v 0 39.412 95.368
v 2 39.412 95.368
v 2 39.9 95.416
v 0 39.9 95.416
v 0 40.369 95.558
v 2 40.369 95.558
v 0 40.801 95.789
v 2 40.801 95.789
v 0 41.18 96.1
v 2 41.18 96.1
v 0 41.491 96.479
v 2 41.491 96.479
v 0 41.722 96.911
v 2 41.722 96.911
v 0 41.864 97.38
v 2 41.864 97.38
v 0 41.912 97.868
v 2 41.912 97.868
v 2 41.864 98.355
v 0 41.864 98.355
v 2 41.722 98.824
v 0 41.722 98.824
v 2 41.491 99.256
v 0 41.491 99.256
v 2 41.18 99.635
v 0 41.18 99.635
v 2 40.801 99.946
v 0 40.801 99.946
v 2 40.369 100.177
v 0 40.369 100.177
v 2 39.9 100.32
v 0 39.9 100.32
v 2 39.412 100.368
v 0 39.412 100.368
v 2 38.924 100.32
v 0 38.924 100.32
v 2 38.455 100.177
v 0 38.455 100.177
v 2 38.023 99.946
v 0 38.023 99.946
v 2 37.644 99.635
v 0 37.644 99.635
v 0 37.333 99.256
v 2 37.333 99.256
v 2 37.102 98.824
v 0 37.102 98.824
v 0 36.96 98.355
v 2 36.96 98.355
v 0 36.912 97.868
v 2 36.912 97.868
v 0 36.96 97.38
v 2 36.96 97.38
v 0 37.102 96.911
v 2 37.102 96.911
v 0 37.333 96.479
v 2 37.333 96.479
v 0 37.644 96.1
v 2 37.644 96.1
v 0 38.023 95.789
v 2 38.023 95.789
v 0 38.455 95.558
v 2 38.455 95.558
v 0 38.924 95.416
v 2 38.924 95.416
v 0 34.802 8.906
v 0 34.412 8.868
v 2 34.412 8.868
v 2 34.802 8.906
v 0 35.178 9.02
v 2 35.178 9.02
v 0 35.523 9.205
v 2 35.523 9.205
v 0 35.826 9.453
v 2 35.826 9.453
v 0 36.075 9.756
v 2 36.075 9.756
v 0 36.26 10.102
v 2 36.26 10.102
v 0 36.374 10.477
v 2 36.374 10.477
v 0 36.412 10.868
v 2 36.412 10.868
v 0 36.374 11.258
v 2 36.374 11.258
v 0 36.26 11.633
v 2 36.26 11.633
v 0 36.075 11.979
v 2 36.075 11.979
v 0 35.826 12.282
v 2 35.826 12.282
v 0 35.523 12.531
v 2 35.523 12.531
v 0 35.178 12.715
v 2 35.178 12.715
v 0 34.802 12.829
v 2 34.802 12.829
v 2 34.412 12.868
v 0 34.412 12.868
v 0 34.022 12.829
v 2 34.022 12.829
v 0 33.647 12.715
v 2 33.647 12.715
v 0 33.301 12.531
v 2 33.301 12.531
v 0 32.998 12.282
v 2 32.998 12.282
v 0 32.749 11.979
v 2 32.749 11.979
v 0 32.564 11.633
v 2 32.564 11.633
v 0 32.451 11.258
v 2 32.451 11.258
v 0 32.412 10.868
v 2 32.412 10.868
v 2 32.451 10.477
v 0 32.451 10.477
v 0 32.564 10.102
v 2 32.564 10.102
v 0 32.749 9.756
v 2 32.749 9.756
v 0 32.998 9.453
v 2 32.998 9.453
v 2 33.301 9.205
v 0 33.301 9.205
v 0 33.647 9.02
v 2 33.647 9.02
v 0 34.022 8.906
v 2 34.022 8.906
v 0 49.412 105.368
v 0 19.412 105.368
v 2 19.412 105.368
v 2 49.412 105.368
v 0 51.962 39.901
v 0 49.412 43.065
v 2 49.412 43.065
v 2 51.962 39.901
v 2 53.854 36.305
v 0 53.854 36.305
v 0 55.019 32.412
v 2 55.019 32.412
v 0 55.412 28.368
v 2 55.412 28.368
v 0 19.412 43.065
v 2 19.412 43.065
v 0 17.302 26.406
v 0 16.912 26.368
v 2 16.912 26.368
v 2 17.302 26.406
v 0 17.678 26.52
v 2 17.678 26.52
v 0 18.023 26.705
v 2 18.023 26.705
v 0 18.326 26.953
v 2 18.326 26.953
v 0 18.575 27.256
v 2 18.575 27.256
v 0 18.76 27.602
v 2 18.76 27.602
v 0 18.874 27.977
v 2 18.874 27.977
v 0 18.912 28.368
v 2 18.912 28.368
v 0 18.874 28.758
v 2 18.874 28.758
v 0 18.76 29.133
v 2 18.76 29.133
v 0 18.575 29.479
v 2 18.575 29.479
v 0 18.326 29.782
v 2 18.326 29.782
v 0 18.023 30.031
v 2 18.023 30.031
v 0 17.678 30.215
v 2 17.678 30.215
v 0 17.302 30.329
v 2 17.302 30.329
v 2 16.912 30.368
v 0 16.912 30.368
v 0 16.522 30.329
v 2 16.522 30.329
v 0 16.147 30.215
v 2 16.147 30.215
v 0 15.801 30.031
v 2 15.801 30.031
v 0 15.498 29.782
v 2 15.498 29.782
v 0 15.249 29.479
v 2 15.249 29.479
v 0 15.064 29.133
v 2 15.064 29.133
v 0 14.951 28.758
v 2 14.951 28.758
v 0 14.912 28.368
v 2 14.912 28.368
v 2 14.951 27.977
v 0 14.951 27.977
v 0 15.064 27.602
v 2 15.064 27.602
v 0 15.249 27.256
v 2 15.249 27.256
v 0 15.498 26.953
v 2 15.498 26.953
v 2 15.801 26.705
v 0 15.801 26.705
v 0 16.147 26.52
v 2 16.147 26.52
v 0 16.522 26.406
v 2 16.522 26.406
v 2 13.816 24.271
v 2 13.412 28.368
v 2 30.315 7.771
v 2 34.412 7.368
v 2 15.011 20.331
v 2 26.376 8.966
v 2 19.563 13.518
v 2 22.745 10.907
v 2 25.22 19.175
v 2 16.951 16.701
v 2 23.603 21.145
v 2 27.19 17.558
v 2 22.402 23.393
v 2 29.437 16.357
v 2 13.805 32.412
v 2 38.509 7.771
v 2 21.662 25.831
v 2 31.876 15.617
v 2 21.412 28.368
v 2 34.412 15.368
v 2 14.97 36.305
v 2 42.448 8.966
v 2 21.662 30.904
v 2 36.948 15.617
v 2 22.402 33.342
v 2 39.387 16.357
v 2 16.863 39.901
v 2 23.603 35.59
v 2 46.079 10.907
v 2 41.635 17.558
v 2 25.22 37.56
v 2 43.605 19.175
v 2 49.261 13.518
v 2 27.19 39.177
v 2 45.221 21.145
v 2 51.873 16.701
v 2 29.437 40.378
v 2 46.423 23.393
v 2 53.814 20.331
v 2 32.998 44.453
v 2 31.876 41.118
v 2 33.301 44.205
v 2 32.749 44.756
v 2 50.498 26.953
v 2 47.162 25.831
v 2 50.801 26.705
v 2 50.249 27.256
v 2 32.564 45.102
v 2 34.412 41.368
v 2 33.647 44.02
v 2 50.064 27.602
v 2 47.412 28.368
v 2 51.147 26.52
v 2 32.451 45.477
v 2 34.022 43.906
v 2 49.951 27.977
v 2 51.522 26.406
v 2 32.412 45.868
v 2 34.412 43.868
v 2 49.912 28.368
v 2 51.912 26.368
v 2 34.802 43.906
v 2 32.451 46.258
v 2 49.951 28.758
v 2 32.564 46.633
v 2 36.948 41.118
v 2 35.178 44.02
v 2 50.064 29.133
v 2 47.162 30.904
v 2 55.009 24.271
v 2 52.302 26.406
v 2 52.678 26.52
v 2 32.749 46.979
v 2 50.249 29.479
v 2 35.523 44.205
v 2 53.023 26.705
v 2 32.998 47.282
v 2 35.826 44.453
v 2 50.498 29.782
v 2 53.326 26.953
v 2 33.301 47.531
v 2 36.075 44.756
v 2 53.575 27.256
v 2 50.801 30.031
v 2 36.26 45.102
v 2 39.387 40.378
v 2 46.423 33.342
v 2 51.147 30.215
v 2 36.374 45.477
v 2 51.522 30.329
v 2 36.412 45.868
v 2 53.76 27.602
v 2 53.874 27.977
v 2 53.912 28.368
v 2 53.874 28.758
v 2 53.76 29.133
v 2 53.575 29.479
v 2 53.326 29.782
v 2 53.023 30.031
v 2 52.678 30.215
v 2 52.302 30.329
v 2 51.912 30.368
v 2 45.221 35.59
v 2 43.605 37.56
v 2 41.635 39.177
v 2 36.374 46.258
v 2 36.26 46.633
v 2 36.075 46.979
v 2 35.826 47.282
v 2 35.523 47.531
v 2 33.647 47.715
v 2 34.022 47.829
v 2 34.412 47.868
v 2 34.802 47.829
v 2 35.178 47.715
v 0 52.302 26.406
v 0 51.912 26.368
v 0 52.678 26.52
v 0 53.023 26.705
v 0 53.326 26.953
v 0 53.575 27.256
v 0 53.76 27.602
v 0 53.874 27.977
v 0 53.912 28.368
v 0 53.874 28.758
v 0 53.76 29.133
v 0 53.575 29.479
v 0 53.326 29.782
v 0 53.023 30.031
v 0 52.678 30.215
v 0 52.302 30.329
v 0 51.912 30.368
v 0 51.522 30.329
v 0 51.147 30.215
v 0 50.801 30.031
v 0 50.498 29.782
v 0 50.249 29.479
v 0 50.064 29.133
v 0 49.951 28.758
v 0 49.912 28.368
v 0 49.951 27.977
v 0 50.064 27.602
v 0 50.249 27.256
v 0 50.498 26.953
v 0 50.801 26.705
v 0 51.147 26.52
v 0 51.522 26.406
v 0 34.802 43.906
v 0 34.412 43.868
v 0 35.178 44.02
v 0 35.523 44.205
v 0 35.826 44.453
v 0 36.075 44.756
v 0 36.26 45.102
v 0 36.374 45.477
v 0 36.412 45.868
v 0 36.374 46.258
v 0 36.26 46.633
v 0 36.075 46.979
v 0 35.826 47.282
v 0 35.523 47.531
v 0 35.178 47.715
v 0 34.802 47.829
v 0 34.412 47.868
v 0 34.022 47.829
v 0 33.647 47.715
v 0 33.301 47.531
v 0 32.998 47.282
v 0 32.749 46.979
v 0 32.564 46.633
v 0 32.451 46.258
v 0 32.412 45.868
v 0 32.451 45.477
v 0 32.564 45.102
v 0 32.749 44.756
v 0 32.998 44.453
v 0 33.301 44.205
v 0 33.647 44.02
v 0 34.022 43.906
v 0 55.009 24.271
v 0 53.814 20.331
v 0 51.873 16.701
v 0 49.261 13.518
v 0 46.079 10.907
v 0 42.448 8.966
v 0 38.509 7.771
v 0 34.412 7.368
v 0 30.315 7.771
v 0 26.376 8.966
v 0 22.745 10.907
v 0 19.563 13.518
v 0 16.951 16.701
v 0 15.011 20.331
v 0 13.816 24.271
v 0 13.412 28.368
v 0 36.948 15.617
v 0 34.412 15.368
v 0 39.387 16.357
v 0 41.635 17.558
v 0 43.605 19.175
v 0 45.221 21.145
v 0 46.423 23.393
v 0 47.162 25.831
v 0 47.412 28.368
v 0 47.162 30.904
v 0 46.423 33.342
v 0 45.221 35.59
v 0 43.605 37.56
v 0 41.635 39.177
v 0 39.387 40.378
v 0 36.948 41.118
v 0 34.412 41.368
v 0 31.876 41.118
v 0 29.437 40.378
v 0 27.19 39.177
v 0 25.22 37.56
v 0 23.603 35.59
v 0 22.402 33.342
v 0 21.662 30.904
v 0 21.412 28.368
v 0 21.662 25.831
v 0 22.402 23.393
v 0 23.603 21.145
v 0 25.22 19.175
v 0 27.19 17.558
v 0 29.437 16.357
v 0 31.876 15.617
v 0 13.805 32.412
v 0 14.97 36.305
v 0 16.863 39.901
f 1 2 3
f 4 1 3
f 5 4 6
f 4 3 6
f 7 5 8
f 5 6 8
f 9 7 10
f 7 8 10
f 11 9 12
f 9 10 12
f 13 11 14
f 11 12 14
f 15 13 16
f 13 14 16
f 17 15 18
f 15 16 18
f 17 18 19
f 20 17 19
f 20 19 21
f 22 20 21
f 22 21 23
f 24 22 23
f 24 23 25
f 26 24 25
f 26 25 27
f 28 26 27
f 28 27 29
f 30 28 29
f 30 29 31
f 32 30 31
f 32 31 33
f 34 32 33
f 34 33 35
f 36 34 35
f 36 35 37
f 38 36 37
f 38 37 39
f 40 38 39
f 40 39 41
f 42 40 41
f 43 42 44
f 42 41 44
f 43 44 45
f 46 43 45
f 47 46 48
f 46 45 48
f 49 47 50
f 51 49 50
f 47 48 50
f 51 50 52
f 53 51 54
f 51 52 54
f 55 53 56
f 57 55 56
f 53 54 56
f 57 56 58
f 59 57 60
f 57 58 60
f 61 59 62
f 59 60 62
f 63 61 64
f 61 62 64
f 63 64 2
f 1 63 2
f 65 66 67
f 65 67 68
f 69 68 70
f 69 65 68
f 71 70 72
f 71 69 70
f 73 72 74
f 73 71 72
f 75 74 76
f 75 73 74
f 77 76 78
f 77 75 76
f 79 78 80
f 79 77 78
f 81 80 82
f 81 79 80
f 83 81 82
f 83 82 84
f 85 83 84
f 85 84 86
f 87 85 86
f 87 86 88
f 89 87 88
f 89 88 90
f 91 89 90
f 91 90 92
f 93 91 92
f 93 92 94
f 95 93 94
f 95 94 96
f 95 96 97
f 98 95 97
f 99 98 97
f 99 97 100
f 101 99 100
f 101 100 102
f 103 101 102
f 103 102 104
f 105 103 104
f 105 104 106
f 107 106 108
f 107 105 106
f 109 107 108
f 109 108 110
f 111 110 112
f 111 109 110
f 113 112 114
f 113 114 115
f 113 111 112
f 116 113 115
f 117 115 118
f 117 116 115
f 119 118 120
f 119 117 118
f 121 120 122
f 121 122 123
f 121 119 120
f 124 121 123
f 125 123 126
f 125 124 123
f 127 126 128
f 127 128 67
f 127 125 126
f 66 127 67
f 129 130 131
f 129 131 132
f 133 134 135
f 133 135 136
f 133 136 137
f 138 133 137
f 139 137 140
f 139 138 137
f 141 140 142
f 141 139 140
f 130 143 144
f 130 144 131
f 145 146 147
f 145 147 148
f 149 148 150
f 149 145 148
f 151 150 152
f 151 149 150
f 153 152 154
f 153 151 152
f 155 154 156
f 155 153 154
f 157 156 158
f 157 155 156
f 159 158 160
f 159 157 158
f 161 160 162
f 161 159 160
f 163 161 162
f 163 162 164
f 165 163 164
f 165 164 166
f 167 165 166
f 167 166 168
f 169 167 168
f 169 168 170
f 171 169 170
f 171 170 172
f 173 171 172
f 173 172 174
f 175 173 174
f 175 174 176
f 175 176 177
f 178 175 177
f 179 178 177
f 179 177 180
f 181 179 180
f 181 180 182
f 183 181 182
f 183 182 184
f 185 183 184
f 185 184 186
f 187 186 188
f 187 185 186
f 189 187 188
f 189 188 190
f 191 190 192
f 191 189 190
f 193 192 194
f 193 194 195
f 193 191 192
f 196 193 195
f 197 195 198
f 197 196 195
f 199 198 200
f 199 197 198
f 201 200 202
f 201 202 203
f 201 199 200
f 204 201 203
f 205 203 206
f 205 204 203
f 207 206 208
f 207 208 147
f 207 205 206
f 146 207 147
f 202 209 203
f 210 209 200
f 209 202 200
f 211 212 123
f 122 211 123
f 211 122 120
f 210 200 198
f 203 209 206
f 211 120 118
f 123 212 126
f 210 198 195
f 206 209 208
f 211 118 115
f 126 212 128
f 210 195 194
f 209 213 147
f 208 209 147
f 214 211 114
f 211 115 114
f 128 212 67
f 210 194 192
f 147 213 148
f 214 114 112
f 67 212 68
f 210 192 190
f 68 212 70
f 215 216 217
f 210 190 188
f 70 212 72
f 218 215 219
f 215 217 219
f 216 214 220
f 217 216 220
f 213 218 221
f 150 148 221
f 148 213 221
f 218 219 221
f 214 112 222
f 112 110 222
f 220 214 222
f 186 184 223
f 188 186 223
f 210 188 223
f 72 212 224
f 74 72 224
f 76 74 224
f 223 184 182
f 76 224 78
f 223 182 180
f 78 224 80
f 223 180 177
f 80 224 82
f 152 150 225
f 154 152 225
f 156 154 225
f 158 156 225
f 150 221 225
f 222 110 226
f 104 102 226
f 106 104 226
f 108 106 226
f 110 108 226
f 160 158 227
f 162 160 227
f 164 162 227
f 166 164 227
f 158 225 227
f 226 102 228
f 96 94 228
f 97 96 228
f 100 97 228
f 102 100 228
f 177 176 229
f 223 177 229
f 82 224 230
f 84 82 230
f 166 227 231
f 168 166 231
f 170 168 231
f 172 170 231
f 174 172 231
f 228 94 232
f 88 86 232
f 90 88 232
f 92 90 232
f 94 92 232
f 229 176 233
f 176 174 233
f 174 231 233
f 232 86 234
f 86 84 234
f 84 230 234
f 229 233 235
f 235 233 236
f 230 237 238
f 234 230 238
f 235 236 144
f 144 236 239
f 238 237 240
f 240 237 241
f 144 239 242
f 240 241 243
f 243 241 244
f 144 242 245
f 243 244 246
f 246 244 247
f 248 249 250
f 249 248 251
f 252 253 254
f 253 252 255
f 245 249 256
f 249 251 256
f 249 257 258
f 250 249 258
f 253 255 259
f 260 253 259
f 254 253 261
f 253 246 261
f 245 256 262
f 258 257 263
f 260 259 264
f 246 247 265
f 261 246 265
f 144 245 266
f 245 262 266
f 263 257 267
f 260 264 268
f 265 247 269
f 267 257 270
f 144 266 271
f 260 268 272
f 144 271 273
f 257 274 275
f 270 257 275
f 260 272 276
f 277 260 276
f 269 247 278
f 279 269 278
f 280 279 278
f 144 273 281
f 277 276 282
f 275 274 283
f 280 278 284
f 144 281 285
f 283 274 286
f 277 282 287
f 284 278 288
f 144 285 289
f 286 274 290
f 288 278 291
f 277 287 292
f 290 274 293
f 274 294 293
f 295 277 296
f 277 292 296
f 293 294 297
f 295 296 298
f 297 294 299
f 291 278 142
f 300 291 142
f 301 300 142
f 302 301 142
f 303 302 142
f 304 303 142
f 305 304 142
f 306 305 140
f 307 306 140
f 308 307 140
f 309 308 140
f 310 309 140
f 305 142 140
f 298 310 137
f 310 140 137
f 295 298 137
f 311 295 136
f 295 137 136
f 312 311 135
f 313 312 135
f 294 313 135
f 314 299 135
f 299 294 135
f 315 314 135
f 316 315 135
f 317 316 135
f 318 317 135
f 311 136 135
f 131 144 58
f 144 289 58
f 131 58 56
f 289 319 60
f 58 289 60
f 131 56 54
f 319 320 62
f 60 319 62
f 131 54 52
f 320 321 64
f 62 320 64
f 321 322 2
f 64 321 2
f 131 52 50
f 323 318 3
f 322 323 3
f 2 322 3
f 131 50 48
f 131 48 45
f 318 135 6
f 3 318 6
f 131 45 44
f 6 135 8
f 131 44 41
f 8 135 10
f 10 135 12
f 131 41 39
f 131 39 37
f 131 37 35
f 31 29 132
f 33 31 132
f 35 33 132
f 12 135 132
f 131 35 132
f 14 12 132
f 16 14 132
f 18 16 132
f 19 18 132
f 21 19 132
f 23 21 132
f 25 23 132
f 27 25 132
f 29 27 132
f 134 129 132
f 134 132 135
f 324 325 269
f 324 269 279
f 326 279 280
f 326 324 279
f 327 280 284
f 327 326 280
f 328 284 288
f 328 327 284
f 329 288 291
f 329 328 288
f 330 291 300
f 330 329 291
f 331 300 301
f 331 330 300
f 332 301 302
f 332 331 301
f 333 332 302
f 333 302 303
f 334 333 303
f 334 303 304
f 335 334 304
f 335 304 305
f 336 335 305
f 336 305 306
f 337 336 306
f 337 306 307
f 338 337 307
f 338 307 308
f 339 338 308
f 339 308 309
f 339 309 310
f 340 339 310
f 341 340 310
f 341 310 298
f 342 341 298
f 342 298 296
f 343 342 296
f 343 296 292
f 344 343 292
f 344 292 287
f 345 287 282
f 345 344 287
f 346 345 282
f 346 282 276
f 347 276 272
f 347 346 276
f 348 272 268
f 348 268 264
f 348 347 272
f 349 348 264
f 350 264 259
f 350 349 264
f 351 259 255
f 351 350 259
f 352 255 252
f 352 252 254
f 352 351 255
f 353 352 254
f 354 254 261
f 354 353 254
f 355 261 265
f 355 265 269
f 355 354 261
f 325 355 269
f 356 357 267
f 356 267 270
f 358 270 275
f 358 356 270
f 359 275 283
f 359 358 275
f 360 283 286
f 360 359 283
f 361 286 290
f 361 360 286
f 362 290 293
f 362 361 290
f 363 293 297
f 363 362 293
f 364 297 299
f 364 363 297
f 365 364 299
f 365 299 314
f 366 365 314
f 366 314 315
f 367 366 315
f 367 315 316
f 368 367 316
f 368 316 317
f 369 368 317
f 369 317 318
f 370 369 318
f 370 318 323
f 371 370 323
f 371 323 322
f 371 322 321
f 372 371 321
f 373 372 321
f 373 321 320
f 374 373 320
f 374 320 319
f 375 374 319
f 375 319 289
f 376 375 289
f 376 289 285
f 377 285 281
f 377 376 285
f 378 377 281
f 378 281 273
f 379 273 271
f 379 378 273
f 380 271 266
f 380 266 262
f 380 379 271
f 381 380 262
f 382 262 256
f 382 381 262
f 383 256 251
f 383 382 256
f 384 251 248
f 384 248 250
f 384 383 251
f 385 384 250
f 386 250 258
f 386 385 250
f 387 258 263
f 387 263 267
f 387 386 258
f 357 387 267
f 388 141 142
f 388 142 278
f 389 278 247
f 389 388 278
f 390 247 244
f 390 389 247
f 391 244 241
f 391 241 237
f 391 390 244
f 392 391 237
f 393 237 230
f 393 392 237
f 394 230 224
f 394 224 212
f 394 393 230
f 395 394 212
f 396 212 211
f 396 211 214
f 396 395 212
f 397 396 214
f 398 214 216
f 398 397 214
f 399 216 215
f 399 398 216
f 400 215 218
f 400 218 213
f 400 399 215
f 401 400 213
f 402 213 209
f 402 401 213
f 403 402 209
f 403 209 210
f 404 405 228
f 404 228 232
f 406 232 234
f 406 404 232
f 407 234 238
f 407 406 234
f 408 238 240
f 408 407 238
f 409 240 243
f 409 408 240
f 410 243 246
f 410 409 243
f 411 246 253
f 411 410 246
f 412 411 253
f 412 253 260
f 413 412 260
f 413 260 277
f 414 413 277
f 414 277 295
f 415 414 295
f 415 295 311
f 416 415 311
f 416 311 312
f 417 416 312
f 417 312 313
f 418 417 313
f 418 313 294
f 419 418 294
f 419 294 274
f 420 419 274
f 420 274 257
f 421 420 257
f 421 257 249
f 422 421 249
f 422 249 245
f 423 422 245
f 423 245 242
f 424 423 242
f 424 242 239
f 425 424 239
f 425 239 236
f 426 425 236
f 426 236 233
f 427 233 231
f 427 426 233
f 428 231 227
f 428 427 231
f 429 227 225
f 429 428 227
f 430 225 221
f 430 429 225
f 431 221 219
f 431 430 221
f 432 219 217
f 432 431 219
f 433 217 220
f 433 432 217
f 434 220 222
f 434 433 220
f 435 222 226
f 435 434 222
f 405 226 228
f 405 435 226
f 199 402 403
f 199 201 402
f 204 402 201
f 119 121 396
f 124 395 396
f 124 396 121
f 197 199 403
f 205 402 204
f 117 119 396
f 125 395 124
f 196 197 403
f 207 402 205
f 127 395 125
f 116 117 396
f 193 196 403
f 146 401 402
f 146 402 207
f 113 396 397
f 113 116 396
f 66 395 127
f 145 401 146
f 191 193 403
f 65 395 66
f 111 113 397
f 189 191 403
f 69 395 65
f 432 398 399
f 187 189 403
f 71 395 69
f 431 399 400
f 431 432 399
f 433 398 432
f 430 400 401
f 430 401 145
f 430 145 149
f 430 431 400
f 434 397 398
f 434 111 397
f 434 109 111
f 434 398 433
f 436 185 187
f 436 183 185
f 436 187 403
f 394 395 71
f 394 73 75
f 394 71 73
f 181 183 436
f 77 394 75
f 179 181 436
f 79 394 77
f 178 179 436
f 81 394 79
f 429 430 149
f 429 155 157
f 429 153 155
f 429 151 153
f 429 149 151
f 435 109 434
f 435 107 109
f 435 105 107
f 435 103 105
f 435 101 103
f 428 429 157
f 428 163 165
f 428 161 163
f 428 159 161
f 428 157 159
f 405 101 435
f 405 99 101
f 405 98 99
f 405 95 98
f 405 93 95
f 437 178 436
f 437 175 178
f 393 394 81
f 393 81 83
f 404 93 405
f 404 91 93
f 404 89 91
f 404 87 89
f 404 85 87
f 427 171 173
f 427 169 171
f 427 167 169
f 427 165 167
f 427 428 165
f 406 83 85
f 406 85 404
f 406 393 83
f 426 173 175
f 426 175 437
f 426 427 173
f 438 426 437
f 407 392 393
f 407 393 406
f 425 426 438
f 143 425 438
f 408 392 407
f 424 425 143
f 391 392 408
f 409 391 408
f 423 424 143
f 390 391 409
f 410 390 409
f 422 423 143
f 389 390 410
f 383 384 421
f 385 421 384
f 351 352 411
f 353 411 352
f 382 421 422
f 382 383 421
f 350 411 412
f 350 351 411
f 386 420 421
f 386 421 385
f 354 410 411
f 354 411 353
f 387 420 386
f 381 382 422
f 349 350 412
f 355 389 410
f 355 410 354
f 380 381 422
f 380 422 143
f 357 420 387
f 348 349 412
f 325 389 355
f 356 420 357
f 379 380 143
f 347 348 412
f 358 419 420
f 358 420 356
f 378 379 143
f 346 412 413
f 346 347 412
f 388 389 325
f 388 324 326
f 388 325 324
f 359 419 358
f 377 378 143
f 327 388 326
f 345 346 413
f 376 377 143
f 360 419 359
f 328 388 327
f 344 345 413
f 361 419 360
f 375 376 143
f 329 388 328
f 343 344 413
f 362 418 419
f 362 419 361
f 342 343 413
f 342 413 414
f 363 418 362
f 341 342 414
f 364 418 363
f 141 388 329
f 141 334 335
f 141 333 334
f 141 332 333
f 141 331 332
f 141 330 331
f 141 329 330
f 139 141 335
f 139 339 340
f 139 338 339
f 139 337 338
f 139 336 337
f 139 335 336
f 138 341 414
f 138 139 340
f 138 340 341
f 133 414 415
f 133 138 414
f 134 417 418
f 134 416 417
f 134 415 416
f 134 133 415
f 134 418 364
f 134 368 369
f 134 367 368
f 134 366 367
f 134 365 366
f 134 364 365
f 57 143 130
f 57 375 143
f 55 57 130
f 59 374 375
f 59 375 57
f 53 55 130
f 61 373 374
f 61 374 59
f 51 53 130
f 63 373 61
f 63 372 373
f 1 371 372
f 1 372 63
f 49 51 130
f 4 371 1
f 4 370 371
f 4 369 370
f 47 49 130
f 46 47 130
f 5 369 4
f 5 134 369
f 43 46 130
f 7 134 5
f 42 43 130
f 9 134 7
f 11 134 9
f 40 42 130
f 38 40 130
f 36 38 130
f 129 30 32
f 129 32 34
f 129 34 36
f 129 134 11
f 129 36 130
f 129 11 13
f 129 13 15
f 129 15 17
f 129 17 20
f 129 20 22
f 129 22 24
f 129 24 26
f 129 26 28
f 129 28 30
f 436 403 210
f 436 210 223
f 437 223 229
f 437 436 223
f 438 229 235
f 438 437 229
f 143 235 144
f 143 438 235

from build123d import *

# Parameters (mm, degrees)
EXTRUDE_1_DEPTH     = 2
CUT_EXTRUDE_START   = -3
SKETCH_2_R          = 2
SKETCH_2_R_2        = 13
CUT_EXTRUDE_1_DEPTH = 3
CUT_EXTRUDE_START_2 = -10
CUT_EXTRUDE_2_DEPTH = 10
SKETCH_3_R          = 2.5
CUT_EXTRUDE_4_DEPTH = 10


with BuildPart() as part:
    # 草图1 → 凸台-拉伸1 (new body)
    with BuildSketch(Plane(origin=(0, 0, 0), x_dir=(0, 0, -1), z_dir=(1, 0, 0))):
        with BuildLine():
            Line((-105.367573178, 55.412145146), (-28.367573178, 55.412145146))
            ThreePointArc((-28.367573178, 55.412145146), (-7.367573178, 34.412145146), (-28.367573178, 13.412145146))
            Line((-28.367573178, 13.412145146), (-105.367573178, 13.412145146))
            Line((-105.367573178, 13.412145146), (-105.367573178, 55.412145146))
        make_face()
    extrude(amount=EXTRUDE_1_DEPTH)

    # 草图2 → 切除-拉伸1 (cut)
    with BuildSketch(Plane(origin=(2, 0, 0), x_dir=(0, 0, -1), z_dir=(1, 0, 0)).offset(CUT_EXTRUDE_START)):
        with BuildLine():
            Line((-43.064511635, 19.412145146), (-105.367573178, 19.412145146))
            Line((-105.367573178, 19.412145146), (-105.367573178, 13.412145146))
            Line((-105.367573178, 13.412145146), (-28.367573178, 13.412145146))
            ThreePointArc((-28.367573178, 13.412145146), (-36.304827111, 14.96992305), (-43.064511635, 19.412145146))
        make_face()
        with Locations((-28.367573178, 51.912145146)):
            Circle(SKETCH_2_R)
        with Locations((-28.367573178, 16.912145146)):
            Circle(SKETCH_2_R)
        with Locations((-45.867573178, 34.412145146)):
            Circle(SKETCH_2_R)
        with Locations((-10.867573178, 34.412145146)):
            Circle(SKETCH_2_R)
        with Locations((-28.367573178, 34.412145146)):
            Circle(SKETCH_2_R_2)
    extrude(amount=CUT_EXTRUDE_1_DEPTH, mode=Mode.SUBTRACT)

    # 草图2<3> → 切除-拉伸2 (cut)
    with BuildSketch(Plane(origin=(2, 0, 0), x_dir=(0, 0, -1), z_dir=(1, 0, 0)).offset(CUT_EXTRUDE_START_2)):
        with BuildLine():
            Line((-105.367573178, 55.412145146), (-105.367573178, 49.412145146))
            Line((-105.367573178, 49.412145146), (-43.064511635, 49.412145146))
            ThreePointArc((-43.064511635, 49.412145146), (-36.304827111, 53.854367241), (-28.367573178, 55.412145146))
            Line((-28.367573178, 55.412145146), (-105.367573178, 55.412145146))
        make_face()
    extrude(amount=CUT_EXTRUDE_2_DEPTH, mode=Mode.SUBTRACT)

    # 草图3 → 切除-拉伸4 (cut)
    with BuildSketch(Plane(origin=(2, 0, 0), x_dir=(0, 0, -1), z_dir=(1, 0, 0))):
        with Locations((-97.867573178, 39.412145146)):
            Circle(SKETCH_3_R)
    extrude(amount=-CUT_EXTRUDE_4_DEPTH, mode=Mode.SUBTRACT)


solid = part.part
